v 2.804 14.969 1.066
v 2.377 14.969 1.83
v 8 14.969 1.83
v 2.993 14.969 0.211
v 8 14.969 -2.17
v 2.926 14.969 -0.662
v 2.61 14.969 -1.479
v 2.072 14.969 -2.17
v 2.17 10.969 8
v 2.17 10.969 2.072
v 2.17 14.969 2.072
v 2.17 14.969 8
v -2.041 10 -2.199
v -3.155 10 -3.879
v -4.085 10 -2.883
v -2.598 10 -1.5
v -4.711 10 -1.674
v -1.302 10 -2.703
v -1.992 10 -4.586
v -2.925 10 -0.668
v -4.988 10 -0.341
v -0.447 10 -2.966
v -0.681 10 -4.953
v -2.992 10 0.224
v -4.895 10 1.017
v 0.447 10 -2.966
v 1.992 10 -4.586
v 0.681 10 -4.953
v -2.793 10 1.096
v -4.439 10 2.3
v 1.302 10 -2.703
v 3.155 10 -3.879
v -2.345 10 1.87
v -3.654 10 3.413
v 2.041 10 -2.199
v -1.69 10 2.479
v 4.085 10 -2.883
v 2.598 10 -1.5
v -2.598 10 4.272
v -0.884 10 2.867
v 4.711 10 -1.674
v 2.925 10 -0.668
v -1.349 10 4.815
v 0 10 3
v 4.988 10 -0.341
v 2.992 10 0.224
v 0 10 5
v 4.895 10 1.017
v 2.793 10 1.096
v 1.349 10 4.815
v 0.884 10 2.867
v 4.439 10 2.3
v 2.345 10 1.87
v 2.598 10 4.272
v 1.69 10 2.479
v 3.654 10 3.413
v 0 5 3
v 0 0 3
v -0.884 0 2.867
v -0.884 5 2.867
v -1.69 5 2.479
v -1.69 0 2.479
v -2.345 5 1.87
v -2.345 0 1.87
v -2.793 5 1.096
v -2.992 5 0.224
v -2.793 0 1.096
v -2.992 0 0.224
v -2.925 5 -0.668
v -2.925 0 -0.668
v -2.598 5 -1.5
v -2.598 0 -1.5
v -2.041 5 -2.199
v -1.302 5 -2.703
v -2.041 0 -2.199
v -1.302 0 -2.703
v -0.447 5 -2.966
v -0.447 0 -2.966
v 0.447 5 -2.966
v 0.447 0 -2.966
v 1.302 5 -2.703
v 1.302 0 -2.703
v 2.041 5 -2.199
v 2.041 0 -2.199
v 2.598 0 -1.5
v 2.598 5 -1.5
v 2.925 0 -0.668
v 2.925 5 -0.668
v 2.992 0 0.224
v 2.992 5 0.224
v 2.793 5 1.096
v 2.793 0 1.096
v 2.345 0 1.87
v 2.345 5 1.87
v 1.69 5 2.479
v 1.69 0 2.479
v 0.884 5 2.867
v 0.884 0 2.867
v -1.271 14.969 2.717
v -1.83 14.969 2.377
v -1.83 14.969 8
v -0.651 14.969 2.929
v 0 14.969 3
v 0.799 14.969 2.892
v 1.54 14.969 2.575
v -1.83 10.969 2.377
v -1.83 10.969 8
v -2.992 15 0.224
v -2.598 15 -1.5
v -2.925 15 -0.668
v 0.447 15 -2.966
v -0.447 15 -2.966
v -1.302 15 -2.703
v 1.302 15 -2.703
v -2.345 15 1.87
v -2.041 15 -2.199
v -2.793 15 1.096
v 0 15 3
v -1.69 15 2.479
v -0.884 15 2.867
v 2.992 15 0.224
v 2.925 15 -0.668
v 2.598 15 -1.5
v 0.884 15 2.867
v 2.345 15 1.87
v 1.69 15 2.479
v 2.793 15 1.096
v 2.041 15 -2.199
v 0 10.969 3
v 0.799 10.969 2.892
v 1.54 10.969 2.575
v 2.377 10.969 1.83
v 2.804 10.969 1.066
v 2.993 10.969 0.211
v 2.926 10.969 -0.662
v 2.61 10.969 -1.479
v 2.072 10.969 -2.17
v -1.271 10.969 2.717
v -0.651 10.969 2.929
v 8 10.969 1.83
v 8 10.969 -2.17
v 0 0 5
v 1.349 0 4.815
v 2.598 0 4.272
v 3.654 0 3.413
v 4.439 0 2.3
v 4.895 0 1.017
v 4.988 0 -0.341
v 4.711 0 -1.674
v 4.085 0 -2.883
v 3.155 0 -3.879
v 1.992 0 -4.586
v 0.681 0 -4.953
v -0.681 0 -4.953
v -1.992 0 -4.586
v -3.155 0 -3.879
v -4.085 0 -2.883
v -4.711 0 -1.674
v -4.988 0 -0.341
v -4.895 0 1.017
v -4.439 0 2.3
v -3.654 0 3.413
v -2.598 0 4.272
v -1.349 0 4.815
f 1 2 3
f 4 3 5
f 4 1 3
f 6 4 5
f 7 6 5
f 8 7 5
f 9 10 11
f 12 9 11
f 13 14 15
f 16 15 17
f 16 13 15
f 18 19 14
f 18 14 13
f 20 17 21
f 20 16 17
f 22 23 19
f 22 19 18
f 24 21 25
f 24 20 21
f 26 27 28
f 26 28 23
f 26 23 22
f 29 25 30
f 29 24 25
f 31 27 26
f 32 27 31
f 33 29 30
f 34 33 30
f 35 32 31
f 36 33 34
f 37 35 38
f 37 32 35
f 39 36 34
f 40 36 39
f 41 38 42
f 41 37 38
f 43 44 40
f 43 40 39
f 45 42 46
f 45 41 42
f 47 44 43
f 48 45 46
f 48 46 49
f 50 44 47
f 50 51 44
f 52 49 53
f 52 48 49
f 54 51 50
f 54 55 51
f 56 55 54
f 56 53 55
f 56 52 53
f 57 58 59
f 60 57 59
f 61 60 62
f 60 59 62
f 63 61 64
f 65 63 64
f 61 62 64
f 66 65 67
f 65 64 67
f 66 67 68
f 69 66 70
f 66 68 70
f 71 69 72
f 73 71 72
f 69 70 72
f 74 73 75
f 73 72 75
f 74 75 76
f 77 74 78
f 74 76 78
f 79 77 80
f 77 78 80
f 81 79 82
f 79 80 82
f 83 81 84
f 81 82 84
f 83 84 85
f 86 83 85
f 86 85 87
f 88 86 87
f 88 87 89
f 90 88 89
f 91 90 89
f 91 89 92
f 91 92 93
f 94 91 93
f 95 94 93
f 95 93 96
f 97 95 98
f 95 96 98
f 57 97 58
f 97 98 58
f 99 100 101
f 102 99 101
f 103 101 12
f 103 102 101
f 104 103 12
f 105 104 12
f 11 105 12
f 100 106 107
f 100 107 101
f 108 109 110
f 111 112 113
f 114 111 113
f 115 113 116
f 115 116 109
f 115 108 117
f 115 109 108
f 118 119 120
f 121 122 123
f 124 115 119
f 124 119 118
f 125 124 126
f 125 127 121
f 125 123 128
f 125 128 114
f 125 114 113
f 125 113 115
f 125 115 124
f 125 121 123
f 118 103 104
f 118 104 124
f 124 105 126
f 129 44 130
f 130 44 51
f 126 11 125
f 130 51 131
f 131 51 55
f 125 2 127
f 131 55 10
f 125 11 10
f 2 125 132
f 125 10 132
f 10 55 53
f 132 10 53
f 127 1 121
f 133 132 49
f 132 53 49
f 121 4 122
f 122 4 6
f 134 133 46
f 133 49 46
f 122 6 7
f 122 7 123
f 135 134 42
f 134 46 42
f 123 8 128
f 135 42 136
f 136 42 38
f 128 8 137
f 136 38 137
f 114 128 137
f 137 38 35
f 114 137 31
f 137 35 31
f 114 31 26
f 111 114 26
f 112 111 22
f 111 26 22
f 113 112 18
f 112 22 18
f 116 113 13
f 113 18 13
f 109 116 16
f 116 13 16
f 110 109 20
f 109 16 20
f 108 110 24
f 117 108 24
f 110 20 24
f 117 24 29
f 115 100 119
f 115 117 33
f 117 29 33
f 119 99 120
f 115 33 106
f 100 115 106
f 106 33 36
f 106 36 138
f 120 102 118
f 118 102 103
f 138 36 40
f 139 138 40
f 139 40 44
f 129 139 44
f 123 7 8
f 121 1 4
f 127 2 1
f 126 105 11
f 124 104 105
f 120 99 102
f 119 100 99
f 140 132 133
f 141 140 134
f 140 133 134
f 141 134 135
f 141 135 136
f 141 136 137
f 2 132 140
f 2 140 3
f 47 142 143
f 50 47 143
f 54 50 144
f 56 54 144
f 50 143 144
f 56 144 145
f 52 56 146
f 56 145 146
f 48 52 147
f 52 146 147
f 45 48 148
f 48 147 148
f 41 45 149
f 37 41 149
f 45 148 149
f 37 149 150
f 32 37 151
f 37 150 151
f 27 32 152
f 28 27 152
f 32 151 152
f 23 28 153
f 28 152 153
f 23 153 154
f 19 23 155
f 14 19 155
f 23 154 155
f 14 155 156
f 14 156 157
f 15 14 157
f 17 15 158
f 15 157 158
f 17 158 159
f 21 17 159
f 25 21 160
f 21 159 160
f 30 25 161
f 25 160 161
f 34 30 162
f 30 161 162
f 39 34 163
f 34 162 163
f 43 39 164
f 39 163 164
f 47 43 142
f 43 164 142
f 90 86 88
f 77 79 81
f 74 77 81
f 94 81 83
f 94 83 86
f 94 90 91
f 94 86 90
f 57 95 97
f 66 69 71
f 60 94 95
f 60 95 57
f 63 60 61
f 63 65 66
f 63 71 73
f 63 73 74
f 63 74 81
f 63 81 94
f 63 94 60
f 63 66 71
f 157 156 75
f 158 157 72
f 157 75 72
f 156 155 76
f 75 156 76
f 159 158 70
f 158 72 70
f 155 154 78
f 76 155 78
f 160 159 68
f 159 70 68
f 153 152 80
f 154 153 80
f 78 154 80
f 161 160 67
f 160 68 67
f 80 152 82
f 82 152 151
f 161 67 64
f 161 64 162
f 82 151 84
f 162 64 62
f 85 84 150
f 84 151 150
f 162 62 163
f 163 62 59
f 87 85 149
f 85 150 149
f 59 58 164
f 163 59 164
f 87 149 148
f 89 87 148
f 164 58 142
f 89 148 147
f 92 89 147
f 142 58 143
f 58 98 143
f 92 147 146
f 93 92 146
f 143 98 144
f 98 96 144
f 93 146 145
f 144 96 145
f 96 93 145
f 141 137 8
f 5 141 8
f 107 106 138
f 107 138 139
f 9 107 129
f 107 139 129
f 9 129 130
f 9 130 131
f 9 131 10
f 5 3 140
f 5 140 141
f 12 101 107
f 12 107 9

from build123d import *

# Parameters (mm, degrees)
SKETCH1_R           = 5
BOSS_EXTRUDE1_DEPTH = 10
SKETCH2_R           = 3
BOSS_EXTRUDE2_DEPTH = 5
SKETCH3_R           = 3
CUT_EXTRUDE1_DEPTH  = 5
SKETCH4_W           = 4
SKETCH4_H           = 4
BOSS_EXTRUDE3_DEPTH = 8
CIRPATTERN1_COUNT   = 2
CIRPATTERN1_ANGLE   = 90


with BuildPart() as part:
    # Sketch1 → Boss-Extrude1 (new body)
    with BuildSketch(Plane(origin=(0, 0, 0), x_dir=(1, 0, 0), z_dir=(0, 1, 0))):
        with Locations(Location((0, 0, 0), (0, 0, 270))):
            Circle(SKETCH1_R)
    extrude(amount=BOSS_EXTRUDE1_DEPTH)

    # Sketch2 → Boss-Extrude2 (add)
    with BuildSketch(Plane(origin=(0, 10, 0), x_dir=(1, 0, 0), z_dir=(0, 1, 0))):
        with Locations(Location((0, 0, 0), (0, 0, 270))):
            Circle(SKETCH2_R)
    extrude(amount=BOSS_EXTRUDE2_DEPTH)

    # Sketch3 → Cut-Extrude1 (cut)
    with BuildSketch(Plane.XZ):
        with Locations(Location((0, 0, 0), (0, 0, 90))):
            Circle(SKETCH3_R)
    extrude(amount=-CUT_EXTRUDE1_DEPTH, mode=Mode.SUBTRACT)

    # Sketch4 → Boss-Extrude3 (add)
    with BuildSketch(Plane.XY):
        with Locations((0.169651393, 12.969101694)):
            Rectangle(SKETCH4_W, SKETCH4_H)
    boss_extrude3 = extrude(amount=BOSS_EXTRUDE3_DEPTH)

    # CirPattern1: Boss-Extrude3 ×2 about axis
    cirpattern1_axis = Axis((0, 0, 0), (0, 1, 0))
    for i in range(1, CIRPATTERN1_COUNT):
        add(boss_extrude3.rotate(cirpattern1_axis, i * CIRPATTERN1_ANGLE / (CIRPATTERN1_COUNT - 1)))


solid = part.part
